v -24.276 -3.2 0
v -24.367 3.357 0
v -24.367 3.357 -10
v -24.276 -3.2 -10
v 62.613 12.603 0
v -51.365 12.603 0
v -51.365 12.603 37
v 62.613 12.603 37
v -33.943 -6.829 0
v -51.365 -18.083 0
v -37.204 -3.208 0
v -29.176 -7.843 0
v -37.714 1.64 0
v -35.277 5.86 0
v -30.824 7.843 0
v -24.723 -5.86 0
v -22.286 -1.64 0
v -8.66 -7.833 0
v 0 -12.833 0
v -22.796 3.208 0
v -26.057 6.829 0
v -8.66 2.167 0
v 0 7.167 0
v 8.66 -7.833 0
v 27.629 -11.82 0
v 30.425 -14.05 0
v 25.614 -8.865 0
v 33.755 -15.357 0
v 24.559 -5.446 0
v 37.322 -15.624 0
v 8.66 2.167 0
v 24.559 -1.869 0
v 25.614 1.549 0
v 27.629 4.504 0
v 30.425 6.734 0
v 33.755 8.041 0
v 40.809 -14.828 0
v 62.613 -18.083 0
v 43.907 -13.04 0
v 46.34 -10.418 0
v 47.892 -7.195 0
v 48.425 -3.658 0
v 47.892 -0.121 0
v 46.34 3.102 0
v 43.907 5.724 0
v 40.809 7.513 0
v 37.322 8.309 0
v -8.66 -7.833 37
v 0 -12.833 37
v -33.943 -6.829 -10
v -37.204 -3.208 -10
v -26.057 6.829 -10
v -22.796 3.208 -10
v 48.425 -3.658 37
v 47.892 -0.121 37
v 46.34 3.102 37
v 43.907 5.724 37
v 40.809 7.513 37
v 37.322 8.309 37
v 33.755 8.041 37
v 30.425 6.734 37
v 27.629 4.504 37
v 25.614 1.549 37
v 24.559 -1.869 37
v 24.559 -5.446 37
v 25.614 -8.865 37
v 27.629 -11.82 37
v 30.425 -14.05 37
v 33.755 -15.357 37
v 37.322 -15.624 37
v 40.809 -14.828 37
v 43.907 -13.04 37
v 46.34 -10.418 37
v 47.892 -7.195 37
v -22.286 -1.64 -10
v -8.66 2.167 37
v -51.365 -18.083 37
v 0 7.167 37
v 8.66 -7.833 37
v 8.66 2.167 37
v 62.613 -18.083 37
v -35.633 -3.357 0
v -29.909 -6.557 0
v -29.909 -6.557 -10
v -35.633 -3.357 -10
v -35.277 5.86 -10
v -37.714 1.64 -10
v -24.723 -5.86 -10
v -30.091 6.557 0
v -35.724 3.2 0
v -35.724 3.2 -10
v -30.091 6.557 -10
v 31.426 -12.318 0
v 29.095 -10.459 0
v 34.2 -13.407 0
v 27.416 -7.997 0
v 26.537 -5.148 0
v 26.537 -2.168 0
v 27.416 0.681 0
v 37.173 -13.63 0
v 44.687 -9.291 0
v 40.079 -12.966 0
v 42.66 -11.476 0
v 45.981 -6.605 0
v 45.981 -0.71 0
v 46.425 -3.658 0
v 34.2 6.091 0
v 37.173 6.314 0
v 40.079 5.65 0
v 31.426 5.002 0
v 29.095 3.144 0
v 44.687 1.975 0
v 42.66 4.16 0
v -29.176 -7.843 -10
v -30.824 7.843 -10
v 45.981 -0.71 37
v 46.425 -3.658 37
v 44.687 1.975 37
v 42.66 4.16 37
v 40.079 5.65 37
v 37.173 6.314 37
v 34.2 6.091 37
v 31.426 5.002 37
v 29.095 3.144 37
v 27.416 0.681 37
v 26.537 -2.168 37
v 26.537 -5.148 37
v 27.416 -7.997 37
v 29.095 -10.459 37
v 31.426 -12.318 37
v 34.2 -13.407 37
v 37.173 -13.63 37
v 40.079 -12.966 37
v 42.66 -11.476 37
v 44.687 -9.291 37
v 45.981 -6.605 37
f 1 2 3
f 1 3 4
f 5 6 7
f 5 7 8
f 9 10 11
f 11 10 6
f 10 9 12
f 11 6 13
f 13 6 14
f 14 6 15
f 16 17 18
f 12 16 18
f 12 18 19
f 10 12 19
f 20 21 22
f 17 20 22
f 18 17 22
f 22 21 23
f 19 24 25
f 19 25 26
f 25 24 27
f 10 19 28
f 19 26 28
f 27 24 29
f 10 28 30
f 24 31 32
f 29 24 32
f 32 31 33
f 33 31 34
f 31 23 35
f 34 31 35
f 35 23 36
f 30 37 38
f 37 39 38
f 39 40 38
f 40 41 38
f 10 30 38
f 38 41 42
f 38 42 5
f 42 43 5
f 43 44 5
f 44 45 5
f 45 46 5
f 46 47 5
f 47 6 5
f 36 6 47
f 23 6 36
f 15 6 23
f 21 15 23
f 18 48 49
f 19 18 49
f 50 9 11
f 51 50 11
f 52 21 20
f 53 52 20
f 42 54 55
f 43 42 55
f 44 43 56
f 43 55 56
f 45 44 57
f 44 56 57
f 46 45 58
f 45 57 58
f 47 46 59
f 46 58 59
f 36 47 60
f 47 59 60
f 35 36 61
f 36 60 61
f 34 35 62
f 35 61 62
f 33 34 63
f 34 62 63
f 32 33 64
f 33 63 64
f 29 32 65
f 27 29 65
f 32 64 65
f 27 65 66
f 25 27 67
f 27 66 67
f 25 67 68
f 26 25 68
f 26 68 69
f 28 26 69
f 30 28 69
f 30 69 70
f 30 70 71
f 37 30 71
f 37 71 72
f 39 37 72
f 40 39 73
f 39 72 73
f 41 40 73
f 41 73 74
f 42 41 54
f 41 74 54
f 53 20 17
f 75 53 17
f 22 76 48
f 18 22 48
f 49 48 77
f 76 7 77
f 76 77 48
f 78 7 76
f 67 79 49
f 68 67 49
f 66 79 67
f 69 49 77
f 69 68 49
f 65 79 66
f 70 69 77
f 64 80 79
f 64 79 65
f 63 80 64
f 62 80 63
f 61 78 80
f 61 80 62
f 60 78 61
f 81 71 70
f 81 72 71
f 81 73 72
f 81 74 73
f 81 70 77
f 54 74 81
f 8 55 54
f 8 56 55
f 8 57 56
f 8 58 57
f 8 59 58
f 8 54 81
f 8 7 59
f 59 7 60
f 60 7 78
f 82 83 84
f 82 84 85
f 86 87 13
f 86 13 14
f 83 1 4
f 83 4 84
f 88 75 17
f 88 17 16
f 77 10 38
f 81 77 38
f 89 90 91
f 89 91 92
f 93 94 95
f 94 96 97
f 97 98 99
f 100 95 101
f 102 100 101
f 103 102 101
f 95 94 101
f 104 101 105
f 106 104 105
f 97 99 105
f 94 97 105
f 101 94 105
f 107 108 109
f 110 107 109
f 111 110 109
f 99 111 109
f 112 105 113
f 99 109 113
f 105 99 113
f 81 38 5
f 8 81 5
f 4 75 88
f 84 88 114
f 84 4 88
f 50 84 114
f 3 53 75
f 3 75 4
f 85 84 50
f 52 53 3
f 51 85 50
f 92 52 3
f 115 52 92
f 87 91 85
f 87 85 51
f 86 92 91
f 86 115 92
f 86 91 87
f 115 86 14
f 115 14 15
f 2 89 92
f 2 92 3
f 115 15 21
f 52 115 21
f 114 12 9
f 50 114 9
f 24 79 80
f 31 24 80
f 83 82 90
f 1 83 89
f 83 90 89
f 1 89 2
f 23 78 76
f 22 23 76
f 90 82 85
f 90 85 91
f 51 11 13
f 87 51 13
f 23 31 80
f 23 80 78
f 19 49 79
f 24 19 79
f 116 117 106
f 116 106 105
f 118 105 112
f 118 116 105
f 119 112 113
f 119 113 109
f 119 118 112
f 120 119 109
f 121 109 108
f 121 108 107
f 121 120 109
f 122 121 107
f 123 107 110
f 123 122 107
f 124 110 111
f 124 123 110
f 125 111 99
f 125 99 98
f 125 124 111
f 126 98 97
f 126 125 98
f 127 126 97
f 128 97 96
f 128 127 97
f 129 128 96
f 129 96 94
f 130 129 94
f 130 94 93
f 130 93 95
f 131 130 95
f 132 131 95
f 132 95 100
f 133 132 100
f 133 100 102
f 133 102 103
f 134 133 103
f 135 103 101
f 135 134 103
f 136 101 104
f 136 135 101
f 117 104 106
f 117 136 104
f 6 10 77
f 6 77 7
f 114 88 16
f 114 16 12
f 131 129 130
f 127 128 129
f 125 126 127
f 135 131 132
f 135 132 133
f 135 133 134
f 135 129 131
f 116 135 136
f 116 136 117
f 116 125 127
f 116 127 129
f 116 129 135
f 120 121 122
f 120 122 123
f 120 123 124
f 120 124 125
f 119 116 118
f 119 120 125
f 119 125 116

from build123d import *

# Parameters (mm, degrees)
SKETCH1_W           = 113.977664974
SKETCH1_H           = 30.686294416
BOSS_EXTRUDE1_DEPTH = 37
CUT_EXTRUDE1_DEPTH  = 37
SKETCH3_R           = 12
SKETCH3_R_2         = 9.999590175
CUT_EXTRUDE2_DEPTH  = 37
BOSS_EXTRUDE2_DEPTH = 10


with BuildPart() as part:
    # Sketch1 → Boss-Extrude1 (new body)
    with BuildSketch(Plane.XY):
        with Locations((5.623994078, -2.739847716)):
            Rectangle(SKETCH1_W, SKETCH1_H)
    extrude(amount=BOSS_EXTRUDE1_DEPTH)

    # Sketch2 → Cut-Extrude1 (cut)
    with BuildSketch(Plane.XY.offset(37)):
        Polygon((-8.660254038, -7.832783782), (0, -12.832783782), (8.660254038, -7.832783782), (8.660254038, 2.167216218), (0, 7.167216218), (-8.660254038, 2.167216218), align=None)
    extrude(amount=-CUT_EXTRUDE1_DEPTH, mode=Mode.SUBTRACT)

    # Sketch3 → Cut-Extrude2 (cut)
    with BuildSketch(Plane.XY.offset(37)):
        with Locations((36.425340455, -3.657904006)):
            Circle(SKETCH3_R)
        with Locations((36.425340455, -3.657904006)):
            Circle(SKETCH3_R_2, mode=Mode.SUBTRACT)
    extrude(amount=-CUT_EXTRUDE2_DEPTH, mode=Mode.SUBTRACT)


with BuildPart() as cut_extrude2_piece_1:
    # of the separate pieces the step leaves, piece 1, a body of its own (cut_extrude2_pieces)
    add(part.part.solids().sort_by_distance((-51.364838409, 12.603299492, 0))[0])

    # Sketch4 → Boss-Extrude2 (add)
    with BuildSketch(Plane(origin=(0, 0, 0), x_dir=(-1, 0, 0), z_dir=(0, 0, -1))):
        Polygon((22.795810959, 3.207511616), (22.286360611, -1.639584667), (24.723258332, -5.860415333), (29.175692021, -7.842766531), (33.942983341, -6.82944748), (37.204189041, -3.207511616), (37.713639389, 1.639584667), (35.276741668, 5.860415333), (30.824307979, 7.842766531), (26.057016659, 6.82944748), align=None)
        Polygon((24.366696231, 3.357385239), (24.275767209, -3.199891552), (29.909070977, -6.55727679), (35.633303769, -3.357385239), (35.724232791, 3.199891552), (30.090929023, 6.55727679), align=None, mode=Mode.SUBTRACT)
    extrude(amount=BOSS_EXTRUDE2_DEPTH)


with BuildPart() as cut_extrude2_piece_2:
    # of the separate pieces the step leaves, piece 2, a body of its own (cut_extrude2_pieces)
    add(part.part.solids().sort_by_distance((46.42493063, -3.657904006, 0))[0])


solid = Compound([cut_extrude2_piece_1.part, cut_extrude2_piece_2.part])
